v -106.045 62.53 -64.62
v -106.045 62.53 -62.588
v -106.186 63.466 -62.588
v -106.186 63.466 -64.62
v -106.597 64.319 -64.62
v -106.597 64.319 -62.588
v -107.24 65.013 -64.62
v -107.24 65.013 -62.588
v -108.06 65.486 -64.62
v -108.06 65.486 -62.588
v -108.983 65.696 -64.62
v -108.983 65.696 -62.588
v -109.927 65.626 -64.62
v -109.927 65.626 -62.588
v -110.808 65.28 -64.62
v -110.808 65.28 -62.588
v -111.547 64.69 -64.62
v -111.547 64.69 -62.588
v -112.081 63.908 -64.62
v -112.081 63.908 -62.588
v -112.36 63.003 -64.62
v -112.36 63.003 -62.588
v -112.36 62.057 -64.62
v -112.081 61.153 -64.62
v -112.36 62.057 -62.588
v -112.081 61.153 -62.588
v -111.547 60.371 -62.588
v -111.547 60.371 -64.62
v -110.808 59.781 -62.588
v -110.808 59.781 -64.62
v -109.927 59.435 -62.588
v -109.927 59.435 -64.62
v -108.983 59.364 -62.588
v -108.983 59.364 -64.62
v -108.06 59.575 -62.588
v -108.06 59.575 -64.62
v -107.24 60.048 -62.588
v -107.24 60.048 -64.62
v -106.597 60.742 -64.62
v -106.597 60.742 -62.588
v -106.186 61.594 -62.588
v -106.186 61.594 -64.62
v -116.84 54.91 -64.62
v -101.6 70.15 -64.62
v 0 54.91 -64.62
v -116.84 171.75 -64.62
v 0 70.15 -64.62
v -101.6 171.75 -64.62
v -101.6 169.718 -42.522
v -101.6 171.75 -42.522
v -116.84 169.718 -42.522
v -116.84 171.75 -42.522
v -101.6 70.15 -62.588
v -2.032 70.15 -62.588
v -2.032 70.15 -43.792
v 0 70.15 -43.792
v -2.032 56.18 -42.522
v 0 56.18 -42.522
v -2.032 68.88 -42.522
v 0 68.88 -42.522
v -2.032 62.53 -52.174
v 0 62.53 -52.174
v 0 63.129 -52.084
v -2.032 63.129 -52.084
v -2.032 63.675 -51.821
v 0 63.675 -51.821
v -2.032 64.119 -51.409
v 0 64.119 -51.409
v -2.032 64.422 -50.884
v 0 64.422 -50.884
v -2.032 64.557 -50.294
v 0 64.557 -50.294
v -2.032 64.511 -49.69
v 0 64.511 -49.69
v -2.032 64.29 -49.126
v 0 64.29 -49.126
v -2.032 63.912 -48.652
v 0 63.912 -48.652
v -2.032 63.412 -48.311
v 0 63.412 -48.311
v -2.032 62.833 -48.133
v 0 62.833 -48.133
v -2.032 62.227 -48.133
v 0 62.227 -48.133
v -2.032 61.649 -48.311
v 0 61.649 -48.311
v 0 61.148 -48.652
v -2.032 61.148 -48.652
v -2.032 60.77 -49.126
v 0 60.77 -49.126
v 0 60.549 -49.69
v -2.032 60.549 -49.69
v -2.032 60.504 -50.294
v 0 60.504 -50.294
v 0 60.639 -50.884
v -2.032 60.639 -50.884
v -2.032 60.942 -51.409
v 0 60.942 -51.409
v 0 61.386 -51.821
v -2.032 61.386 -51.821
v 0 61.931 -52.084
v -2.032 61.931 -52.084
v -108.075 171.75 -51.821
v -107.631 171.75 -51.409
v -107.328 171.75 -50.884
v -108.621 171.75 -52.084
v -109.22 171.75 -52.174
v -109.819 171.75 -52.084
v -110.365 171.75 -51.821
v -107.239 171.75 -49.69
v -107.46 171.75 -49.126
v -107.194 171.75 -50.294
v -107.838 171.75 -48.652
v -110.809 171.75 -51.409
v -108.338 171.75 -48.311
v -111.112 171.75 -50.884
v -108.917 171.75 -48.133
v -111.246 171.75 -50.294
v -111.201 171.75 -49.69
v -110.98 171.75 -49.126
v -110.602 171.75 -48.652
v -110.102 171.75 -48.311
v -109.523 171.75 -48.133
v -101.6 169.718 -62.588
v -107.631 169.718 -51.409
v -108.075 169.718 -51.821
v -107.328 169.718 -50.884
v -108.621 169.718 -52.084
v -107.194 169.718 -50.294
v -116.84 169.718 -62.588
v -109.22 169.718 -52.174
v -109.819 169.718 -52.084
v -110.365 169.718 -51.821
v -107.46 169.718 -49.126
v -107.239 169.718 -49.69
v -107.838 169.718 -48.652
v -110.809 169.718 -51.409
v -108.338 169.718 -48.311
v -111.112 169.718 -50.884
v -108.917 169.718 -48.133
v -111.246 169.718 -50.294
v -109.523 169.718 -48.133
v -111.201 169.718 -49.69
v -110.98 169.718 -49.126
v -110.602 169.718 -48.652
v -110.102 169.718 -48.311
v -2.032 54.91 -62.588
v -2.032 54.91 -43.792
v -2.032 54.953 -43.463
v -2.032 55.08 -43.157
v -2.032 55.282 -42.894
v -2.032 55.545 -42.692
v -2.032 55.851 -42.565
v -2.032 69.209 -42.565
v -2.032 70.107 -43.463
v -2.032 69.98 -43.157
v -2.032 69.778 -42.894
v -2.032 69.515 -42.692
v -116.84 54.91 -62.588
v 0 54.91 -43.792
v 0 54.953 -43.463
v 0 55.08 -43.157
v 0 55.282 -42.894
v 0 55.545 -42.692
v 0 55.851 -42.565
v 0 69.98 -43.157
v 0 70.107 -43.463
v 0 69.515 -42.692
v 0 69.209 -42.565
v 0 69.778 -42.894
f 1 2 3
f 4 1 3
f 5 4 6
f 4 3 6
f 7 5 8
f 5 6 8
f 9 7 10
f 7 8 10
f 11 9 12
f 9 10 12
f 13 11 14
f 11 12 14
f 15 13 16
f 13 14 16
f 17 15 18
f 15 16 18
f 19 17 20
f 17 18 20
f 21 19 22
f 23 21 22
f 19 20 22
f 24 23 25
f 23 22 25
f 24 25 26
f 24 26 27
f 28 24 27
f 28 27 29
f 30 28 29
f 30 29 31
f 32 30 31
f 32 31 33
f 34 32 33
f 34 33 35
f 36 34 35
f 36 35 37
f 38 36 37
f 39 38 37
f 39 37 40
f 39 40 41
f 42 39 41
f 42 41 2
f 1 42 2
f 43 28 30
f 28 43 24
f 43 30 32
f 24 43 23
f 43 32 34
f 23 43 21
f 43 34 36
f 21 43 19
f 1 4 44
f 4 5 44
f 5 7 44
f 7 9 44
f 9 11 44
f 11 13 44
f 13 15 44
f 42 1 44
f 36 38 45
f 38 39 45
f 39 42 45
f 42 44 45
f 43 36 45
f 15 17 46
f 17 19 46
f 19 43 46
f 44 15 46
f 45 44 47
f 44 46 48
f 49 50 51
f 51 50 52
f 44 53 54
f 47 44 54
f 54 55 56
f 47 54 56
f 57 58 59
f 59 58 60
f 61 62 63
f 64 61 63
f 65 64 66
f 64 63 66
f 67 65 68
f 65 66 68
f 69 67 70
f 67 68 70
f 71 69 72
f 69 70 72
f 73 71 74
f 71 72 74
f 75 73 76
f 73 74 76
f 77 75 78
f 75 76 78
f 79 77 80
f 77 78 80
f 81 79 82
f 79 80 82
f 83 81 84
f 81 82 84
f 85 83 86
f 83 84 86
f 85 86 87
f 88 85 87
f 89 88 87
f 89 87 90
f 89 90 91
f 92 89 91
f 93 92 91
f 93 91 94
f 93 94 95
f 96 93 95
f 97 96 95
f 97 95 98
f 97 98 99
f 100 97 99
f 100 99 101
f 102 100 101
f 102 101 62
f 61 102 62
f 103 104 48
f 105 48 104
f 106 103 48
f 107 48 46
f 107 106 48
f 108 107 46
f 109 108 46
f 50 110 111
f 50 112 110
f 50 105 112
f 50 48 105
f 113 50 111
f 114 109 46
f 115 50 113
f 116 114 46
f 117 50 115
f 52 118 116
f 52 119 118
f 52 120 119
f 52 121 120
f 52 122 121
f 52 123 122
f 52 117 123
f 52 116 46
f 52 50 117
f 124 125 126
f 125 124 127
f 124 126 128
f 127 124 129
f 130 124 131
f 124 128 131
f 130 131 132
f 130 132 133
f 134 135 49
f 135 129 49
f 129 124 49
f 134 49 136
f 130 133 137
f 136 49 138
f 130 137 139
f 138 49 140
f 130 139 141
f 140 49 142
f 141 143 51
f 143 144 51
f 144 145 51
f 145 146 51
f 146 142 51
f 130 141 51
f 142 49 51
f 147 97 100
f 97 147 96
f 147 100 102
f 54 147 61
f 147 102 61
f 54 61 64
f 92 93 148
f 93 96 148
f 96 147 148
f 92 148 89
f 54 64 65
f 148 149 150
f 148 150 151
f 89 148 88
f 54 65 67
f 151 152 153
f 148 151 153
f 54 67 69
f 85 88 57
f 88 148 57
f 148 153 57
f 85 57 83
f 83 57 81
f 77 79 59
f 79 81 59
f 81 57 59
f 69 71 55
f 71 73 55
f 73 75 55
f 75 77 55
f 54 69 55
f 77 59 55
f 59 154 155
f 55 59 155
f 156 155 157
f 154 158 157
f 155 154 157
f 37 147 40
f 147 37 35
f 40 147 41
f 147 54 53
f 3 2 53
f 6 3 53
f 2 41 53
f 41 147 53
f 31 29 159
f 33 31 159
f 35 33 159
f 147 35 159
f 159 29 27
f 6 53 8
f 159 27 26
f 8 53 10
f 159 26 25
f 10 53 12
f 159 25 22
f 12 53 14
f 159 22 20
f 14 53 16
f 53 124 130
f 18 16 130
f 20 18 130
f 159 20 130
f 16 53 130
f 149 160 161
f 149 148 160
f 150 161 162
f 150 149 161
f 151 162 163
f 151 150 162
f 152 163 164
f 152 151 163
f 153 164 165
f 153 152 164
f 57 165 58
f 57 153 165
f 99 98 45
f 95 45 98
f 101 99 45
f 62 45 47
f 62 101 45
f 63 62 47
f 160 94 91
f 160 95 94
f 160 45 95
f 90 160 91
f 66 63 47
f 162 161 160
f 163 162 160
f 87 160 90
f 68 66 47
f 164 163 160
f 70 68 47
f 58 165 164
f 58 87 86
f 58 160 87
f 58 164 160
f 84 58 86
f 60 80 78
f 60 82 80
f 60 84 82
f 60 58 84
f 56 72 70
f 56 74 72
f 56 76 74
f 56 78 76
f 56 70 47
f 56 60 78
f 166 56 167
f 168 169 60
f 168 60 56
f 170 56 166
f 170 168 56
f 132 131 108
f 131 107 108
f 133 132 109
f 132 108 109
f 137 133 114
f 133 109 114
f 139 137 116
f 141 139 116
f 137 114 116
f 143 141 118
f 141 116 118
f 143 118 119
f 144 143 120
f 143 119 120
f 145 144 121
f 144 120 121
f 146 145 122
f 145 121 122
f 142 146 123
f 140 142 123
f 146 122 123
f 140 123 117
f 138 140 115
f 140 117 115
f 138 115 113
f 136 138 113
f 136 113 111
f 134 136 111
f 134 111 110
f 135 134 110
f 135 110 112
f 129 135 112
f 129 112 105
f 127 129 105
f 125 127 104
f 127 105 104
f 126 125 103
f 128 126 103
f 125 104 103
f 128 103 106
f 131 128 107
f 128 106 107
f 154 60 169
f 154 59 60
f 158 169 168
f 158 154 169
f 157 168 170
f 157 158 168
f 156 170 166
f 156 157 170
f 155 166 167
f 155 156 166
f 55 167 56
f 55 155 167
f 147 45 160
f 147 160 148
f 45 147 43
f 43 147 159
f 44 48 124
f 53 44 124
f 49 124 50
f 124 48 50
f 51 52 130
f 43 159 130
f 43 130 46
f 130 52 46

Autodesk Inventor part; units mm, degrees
ref_plane "YZ Plane" through (0, 0, 0) normal (1, 0, 0) x (0, 1, 0)
ref_plane "XZ Plane" through (0, 0, 0) normal (0, 1, 0) x (-1, 0, 0)
ref_plane "XY Plane" through (0, 0, 0) normal (0, 0, 1) x (1, 0, 0)
sketch "Sketch1" plane through (0, 0, 0) normal (1, 0, 0) x (0, 1, 0)
  line L0 (70.1502, -64.6199) -> (54.9102, -64.6199)
  line L1 (54.9102, -64.6199) -> (54.9102, -42.5219)
  line L2 (54.9102, -42.5219) -> (70.1502, -42.5219)
  line L3 (70.1502, -42.5219) -> (70.1502, -64.6199)
  point P0 (0, 0)
  dimension "d0" = 22.098
  dimension "d1" = 15.24
extrude "Extrusion1" add sketch "Sketch1" against normal blind 2.032
sketch "Sketch2" plane through (-2.032, 0, 0) normal (-1, 0, 0) x (0, 0, 1)
  line L0 (-64.6199, 54.9102) -> (-62.5879, 54.9102)
  line L1 (-62.5879, 54.9102) -> (-62.5879, 70.1502)
  line L2 (-62.5879, 70.1502) -> (-64.6199, 70.1502)
  line L3 (-64.6199, 70.1502) -> (-64.6199, 54.9102)
  line L4 (-64.6199, 70.1502) -> (-64.6199, 54.9102) projected
  line L5 (-42.5219, 70.1502) -> (-64.6199, 70.1502) projected
  line L6 (-64.6199, 54.9102) -> (-42.5219, 54.9102) projected
  point P0 (0, 0)
  dimension "d4" = 2.032
extrude "Extrusion2" add sketch "Sketch2" along normal blind 19.05
sketch "Sketch3" plane through (0, 0, 0) normal (1, 0, 0) x (0, 0, -1)
  circle A0 centre (50.1419, 62.5302) radius 2.032
  line L0 (42.5219, 54.9102) -> (42.5219, 70.1502) projected
  point P0 (0, 0)
  point P1 (42.5219, 62.5302)
  dimension "d7" = 7.62
  dimension "d8" = 4.064
extrude "Extrusion3" cut sketch "Sketch3" against normal up to next
fillet "Fillet1" radius 1.27 2 edges at (-1.016, 54.9102, -42.5219) (-1.016, 70.1502, -42.5219)
ref_plane "Work Plane1" through (-21.082, 62.5302, -64.6199) normal (0, 1, 0) x (1, 0, 0)
sketch "Sketch4" plane through (-2.032, 54.9102, -62.5879) normal (0, 0, 1) x (1, 0, 0)
  line L0 (0, 0) -> (-19.05, 0) projected
  line L1 (-19.05, 0) -> (-114.808, 0)
  line L2 (-114.808, 0) -> (-114.808, 95.758)
  line L3 (-114.808, 95.758) -> (-99.568, 95.758)
  line L4 (-99.568, 95.758) -> (-99.568, 15.24)
  line L5 (0, 15.24) -> (-19.05, 15.24) projected
  line L6 (-99.568, 15.24) -> (-19.05, 15.24)
  line L7 (-19.05, 15.24) -> (-19.05, 0)
  circle A0 centre (-107.188, 7.62) radius 3.175
  line L8 (2.032, 1.27) -> (2.032, 13.97) projected
  point P0 (2.032, -54.9102)
  point P1 (-107.188, 95.758)
  dimension "d12" = 6.35
  dimension "d13" = 15.24
  dimension "d14" = 109.22
  dimension "d15" = 88.138
extrude "Extrusion4" add sketch "Sketch4" against normal up to surface (2.032 mm away)
pattern_circular "Circular Pattern1" count 2 over 90 about axis through (-109.22, 62.5302, -62.5879) along (0, 0, 1) of "Extrusion2", "Extrusion1", "Extrusion3"
ref_plane "Work Plane2" through (-109.22, 169.7182, -62.5879) normal (-1, 0, 0) x (0, 0, 1)
properties part number "Ell-Tab"
